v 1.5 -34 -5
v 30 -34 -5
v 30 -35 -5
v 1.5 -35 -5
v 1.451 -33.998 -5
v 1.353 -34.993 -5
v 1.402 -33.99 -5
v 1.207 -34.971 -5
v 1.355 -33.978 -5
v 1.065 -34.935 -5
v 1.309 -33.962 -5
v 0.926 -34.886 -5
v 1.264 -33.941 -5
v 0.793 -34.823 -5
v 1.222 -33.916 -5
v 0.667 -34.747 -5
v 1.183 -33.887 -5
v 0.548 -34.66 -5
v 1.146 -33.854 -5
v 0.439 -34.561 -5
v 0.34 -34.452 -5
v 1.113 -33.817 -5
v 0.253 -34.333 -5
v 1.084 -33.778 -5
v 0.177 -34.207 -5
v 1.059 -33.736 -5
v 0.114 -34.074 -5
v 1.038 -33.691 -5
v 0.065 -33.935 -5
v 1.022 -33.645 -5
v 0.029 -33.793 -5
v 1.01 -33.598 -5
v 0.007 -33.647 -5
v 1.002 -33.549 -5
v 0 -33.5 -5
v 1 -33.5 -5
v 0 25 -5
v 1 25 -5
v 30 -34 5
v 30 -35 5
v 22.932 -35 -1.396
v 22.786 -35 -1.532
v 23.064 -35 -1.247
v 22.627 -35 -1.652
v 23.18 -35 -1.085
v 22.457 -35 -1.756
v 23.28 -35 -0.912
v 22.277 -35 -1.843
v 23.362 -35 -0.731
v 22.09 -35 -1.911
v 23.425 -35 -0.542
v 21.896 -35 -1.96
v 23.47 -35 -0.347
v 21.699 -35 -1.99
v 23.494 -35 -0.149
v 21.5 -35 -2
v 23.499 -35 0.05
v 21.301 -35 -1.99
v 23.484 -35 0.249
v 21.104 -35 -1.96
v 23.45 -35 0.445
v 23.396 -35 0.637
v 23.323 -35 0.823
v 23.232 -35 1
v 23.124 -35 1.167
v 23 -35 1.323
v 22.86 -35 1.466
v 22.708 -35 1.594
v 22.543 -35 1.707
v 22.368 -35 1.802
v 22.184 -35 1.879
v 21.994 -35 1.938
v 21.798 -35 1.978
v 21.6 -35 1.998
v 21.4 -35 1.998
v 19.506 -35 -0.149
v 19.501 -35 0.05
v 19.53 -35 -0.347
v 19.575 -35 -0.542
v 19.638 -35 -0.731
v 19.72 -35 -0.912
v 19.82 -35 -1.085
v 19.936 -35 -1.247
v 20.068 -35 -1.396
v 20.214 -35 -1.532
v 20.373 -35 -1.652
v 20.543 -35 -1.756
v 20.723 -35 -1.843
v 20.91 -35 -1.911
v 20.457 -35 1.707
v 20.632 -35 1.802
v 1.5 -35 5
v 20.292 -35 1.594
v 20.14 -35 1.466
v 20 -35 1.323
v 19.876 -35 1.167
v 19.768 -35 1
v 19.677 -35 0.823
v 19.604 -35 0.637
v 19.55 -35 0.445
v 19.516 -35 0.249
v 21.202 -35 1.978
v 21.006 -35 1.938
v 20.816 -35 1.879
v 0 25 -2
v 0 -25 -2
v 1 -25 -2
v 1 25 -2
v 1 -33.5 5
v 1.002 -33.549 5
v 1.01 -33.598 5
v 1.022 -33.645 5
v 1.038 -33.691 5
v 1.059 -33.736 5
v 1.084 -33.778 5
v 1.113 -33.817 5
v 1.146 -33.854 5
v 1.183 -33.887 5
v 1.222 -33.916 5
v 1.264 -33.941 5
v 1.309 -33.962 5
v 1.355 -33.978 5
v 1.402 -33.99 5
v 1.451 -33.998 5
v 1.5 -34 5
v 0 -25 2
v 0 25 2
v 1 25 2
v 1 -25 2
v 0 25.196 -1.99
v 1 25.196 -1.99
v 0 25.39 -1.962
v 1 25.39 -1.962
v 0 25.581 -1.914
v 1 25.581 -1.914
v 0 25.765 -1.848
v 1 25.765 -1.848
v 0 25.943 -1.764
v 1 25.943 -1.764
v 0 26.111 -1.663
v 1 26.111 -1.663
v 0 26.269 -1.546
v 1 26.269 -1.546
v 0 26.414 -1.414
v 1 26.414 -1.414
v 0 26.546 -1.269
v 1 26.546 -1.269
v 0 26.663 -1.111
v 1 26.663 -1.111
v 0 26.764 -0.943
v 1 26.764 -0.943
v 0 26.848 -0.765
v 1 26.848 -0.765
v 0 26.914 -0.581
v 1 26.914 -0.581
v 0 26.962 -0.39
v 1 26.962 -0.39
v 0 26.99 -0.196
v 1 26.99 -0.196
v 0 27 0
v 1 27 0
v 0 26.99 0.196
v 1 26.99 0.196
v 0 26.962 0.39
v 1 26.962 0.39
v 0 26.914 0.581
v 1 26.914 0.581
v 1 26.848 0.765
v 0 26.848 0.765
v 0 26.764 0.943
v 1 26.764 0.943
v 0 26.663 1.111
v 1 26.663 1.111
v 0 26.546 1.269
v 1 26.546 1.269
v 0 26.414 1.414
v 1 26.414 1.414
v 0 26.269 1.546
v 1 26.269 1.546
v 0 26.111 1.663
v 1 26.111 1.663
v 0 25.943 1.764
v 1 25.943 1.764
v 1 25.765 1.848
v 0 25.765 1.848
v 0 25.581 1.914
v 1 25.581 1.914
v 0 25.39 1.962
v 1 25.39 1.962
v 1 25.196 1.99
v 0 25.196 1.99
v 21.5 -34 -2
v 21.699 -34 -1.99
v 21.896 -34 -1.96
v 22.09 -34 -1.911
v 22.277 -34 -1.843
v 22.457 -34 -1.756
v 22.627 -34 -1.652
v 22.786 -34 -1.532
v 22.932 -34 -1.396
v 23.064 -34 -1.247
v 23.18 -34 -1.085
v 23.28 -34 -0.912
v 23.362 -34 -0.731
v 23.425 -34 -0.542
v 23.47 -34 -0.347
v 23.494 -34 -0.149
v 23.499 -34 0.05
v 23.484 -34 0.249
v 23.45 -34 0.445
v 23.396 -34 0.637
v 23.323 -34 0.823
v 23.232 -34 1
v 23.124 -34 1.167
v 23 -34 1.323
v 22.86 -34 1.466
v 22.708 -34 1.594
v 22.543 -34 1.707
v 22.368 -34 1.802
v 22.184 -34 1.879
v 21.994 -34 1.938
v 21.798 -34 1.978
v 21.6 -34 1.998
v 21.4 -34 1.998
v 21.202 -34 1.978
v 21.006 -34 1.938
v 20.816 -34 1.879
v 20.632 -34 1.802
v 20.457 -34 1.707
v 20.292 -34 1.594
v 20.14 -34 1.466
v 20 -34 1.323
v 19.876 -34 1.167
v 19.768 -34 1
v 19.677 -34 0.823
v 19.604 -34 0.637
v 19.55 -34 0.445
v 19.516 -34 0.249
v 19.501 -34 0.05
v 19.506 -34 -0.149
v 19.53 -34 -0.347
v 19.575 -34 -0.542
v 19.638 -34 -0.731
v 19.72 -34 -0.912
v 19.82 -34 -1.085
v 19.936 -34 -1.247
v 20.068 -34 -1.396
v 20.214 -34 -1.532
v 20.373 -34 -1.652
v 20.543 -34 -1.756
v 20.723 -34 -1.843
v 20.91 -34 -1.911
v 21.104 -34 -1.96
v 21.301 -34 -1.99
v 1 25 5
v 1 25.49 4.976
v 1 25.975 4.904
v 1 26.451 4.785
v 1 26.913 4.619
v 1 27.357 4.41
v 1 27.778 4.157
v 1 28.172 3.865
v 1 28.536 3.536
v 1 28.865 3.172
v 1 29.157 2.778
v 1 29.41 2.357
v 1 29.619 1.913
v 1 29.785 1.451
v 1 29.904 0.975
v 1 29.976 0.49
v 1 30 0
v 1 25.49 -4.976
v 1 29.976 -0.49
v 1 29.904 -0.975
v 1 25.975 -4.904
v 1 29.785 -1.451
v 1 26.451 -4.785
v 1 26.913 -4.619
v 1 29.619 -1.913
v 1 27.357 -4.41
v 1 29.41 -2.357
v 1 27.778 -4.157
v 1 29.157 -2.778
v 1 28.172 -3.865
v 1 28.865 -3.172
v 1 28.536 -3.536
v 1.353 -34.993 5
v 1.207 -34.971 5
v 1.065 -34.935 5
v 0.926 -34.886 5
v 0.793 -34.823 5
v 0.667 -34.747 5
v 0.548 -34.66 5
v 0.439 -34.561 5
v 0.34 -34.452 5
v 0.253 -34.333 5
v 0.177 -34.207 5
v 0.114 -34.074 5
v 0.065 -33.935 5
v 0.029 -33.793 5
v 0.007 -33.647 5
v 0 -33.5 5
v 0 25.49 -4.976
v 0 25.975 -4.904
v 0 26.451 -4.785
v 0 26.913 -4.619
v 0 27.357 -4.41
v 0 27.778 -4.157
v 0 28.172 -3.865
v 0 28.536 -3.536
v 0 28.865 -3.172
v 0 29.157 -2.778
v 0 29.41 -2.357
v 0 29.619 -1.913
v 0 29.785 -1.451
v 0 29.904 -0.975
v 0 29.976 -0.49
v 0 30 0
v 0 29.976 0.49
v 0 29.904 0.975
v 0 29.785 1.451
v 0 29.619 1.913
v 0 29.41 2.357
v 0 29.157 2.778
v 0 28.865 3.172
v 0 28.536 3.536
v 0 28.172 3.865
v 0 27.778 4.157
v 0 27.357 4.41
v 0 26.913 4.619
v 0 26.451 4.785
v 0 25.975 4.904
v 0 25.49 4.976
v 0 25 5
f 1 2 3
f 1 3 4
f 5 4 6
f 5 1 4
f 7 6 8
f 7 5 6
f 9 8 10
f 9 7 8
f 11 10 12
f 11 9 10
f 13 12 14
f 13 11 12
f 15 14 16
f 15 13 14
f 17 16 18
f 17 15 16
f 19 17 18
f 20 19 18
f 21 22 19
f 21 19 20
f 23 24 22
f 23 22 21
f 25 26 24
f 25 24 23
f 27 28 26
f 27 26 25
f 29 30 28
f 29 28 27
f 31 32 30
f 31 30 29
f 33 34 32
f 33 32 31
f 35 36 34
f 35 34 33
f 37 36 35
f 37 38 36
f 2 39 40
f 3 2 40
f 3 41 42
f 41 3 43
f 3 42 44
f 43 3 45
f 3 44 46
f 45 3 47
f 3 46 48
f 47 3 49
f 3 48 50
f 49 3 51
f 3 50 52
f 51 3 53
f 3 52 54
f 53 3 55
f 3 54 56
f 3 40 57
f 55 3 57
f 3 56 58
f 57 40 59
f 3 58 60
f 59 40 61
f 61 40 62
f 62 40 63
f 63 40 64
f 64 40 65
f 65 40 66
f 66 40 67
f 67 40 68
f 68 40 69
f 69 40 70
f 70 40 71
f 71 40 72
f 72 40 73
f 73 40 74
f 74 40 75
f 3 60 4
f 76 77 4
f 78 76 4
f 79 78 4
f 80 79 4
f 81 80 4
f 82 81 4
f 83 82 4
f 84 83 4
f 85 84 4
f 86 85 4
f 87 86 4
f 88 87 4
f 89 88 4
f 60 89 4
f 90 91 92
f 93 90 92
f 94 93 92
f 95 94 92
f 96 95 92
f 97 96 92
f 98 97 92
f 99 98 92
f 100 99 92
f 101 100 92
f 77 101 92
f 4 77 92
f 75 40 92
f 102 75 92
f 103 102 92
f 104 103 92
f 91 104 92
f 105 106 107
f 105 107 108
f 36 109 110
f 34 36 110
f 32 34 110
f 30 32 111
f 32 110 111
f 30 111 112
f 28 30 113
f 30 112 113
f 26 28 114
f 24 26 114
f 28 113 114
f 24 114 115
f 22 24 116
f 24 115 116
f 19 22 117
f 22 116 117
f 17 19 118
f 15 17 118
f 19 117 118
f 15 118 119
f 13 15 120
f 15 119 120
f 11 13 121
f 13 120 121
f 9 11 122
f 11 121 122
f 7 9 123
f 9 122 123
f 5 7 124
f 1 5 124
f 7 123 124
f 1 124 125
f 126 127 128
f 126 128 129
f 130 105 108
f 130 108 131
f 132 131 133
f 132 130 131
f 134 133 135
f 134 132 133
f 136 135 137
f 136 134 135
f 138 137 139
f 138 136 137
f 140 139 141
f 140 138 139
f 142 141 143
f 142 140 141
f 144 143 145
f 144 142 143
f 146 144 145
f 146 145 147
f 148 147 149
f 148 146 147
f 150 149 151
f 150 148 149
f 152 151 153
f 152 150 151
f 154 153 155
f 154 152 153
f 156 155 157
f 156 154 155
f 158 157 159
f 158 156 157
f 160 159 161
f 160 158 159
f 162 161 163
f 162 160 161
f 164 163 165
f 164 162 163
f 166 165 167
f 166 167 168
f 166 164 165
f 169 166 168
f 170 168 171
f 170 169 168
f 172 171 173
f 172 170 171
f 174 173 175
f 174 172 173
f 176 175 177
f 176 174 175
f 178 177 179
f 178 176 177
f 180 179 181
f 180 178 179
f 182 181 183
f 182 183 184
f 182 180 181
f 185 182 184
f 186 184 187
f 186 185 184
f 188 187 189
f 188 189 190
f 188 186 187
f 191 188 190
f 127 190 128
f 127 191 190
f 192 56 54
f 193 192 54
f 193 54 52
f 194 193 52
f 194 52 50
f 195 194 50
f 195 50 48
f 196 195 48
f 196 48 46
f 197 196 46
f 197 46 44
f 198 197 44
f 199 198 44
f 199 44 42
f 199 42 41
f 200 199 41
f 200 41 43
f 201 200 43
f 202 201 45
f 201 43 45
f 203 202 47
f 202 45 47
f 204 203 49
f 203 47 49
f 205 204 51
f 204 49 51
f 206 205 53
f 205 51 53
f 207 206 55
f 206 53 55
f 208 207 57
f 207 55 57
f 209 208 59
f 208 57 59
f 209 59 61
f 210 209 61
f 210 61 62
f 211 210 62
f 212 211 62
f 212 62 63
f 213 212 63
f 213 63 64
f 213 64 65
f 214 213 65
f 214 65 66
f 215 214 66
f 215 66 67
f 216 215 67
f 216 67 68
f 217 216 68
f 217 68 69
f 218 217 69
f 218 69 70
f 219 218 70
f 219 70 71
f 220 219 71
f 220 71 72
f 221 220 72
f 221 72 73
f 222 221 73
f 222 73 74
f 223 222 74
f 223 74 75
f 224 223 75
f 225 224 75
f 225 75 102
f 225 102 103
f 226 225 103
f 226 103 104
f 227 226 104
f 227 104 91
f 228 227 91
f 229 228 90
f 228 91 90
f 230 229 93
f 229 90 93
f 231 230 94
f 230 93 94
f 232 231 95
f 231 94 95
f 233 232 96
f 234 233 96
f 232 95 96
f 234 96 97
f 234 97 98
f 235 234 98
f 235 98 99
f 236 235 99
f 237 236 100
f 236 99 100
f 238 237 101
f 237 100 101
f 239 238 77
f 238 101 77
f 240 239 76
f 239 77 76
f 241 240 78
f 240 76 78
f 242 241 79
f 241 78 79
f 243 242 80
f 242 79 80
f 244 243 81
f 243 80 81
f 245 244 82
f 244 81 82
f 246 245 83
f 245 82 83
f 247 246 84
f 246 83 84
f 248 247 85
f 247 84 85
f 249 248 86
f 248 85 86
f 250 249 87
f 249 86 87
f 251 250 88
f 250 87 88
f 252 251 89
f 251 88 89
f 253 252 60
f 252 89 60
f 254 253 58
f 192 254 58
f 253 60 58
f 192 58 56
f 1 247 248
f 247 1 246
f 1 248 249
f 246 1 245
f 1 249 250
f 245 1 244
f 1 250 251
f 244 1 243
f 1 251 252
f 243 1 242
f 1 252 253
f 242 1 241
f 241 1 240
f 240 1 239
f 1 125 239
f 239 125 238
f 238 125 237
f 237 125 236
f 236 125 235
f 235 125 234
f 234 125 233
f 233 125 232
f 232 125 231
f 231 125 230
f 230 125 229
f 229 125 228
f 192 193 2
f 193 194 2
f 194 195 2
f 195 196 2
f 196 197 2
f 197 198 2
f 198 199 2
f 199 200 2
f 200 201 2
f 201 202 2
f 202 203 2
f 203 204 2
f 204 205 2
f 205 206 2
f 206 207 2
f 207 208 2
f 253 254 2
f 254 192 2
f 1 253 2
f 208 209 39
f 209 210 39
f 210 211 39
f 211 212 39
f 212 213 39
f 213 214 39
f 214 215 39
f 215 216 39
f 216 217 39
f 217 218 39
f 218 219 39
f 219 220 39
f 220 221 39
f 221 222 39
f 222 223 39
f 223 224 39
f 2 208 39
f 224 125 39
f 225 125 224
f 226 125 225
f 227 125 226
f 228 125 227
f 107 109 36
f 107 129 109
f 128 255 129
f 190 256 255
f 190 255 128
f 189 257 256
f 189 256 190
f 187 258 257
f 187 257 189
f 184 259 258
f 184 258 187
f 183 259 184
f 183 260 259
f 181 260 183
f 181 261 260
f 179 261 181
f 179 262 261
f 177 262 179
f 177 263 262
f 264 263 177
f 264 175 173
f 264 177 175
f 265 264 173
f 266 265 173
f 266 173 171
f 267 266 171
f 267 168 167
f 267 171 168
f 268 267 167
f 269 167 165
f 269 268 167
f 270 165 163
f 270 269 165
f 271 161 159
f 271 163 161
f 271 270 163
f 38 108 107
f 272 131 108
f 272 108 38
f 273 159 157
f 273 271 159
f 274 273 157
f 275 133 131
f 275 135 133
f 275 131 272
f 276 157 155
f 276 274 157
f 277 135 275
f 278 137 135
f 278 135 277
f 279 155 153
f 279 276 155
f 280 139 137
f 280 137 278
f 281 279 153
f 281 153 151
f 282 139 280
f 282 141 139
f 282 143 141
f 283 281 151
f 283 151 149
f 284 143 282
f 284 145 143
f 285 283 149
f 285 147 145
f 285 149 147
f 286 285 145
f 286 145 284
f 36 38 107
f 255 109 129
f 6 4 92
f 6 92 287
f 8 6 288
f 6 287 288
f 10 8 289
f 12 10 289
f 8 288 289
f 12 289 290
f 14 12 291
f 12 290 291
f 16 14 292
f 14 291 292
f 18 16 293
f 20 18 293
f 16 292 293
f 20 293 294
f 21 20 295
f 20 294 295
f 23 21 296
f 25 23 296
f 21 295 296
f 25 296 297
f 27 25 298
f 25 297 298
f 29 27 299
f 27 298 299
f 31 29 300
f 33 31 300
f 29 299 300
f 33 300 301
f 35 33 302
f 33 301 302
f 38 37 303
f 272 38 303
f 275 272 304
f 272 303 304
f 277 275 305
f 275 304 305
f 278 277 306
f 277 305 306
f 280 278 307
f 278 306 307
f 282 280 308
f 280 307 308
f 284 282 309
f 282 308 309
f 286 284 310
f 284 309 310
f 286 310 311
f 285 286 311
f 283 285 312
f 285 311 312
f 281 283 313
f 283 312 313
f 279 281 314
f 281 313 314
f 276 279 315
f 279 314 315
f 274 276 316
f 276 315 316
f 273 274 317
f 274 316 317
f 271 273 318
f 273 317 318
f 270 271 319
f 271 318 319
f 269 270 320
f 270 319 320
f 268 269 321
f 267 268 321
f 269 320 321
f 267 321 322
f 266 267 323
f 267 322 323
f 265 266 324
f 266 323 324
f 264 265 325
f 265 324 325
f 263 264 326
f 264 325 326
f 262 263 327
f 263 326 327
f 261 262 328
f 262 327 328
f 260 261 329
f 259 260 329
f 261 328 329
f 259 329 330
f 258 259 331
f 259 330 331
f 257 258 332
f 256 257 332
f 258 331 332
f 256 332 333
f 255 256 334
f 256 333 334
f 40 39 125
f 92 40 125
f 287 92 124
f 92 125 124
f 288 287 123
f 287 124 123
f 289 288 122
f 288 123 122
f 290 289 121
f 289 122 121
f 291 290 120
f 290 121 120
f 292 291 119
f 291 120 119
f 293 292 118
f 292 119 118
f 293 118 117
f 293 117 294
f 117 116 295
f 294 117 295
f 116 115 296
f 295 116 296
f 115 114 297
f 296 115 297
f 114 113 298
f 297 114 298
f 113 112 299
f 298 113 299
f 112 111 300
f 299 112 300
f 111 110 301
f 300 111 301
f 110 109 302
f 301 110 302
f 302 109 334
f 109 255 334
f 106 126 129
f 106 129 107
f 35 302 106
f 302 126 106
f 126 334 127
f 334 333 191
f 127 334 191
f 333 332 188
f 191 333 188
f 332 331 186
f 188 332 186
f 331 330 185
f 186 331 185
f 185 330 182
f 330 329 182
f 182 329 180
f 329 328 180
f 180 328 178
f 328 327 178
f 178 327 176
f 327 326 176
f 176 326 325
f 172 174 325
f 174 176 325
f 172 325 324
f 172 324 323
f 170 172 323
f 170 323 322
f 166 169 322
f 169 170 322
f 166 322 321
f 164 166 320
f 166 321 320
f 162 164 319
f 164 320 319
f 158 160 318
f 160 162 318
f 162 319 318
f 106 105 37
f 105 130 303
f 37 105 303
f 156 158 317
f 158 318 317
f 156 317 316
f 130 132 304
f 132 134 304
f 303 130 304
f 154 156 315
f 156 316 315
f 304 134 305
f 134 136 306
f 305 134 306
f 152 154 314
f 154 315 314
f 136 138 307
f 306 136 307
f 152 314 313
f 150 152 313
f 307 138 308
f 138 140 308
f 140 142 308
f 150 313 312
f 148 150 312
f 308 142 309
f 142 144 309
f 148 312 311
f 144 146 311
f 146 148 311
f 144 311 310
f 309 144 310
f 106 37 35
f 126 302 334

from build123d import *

# Parameters (mm, degrees)
AUFSATZ_LINEAR_AUSTRAGEN1_DEPTH = 1
AUFSATZ_LINEAR_AUSTRAGEN2_DEPTH = 10
SKIZZE3_R                       = 2
SCHNITT_LINEAR_AUSTRAGEN1_DEPTH = 72.763500472


with BuildPart() as part:
    # Skizze1 → Aufsatz-Linear austragen1 (new body)
    with BuildSketch(Plane(origin=(0, 0, 0), x_dir=(0, 0, -1), z_dir=(1, 0, 0))):
        with BuildLine():
            Line((-5, -25), (-5, -33.5))
            Line((-5, -33.5), (5, -33.5))
            Line((5, -33.5), (5, -25))
            Line((5, -25), (5, 25))
            ThreePointArc((5, 25), (0, 30), (-5, 25))
            Line((-5, 25), (-5, -25))
        make_face()
        with BuildLine():
            Line((-2, 25), (-2, -25))
            Line((-2, -25), (2, -25))
            Line((2, -25), (2, 25))
            ThreePointArc((2, 25), (0, 27), (-2, 25))
        make_face(mode=Mode.SUBTRACT)
    extrude(amount=AUFSATZ_LINEAR_AUSTRAGEN1_DEPTH)

    # Skizze2 → Aufsatz-Linear austragen2 (add)
    with BuildSketch(Plane.XY.offset(5)):
        with BuildLine():
            Line((1.5, -34), (30, -34))
            Line((30, -34), (30, -35))
            Line((30, -35), (1.5, -35))
            ThreePointArc((1.5, -35), (0.439339828, -34.560660172), (0, -33.5))
            Line((0, -33.5), (1, -33.5))
            ThreePointArc((1, -33.5), (1.146446609, -33.853553391), (1.5, -34))
        make_face()
    extrude(amount=-AUFSATZ_LINEAR_AUSTRAGEN2_DEPTH)

    # Skizze3 → Schnitt-Linear austragen1 (cut, through all)
    with BuildSketch(Plane.XZ.offset(35)):
        with Locations(Location((21.5, 0, 0), (0, 0, 270))):
            Circle(SKIZZE3_R)
    extrude(amount=-SCHNITT_LINEAR_AUSTRAGEN1_DEPTH, mode=Mode.SUBTRACT)


solid = part.part
